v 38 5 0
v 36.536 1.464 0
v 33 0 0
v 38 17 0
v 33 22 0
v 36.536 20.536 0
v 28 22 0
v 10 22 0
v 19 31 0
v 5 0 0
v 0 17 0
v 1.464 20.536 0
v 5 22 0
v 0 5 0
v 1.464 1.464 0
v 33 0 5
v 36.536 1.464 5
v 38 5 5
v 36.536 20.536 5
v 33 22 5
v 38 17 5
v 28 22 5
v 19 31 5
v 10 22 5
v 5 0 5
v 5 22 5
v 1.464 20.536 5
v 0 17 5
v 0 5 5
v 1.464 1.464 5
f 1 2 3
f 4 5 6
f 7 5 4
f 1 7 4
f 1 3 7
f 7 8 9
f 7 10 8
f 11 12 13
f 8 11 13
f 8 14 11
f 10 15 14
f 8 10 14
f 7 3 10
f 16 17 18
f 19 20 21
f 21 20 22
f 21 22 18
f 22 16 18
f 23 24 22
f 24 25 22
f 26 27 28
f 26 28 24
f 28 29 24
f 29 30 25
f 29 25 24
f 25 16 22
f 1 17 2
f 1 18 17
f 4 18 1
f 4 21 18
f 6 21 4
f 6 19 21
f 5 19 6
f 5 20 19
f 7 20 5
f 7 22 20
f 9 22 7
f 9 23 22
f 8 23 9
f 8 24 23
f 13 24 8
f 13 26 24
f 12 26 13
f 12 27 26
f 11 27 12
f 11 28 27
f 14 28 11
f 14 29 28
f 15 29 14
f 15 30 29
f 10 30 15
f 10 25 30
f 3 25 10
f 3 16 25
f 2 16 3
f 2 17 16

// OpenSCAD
$fn = 32;

// ----------------------------------------------------------------------
// Ratchet pawl: 38 x 22 mm body, beak 9 mm сверху
// ----------------------------------------------------------------------

// --- parameters (mm) ---
profile_height = 5;       // extrusion height
profile_points = 15;      // points of the closed outline

profile = [[0, 5], [1.464, 1.464], [5, 0], [33, 0], [36.536, 1.464], [38, 5], [38, 17], [36.536, 20.536], [33, 22], [28, 22], [19, 31], [10, 22], [5, 22], [1.464, 20.536], [0, 17]];  // single closed polygon, 15 points, counter clockwise

// --- the one profile operation ---
linear_extrude(height = profile_height) polygon(points = profile);
